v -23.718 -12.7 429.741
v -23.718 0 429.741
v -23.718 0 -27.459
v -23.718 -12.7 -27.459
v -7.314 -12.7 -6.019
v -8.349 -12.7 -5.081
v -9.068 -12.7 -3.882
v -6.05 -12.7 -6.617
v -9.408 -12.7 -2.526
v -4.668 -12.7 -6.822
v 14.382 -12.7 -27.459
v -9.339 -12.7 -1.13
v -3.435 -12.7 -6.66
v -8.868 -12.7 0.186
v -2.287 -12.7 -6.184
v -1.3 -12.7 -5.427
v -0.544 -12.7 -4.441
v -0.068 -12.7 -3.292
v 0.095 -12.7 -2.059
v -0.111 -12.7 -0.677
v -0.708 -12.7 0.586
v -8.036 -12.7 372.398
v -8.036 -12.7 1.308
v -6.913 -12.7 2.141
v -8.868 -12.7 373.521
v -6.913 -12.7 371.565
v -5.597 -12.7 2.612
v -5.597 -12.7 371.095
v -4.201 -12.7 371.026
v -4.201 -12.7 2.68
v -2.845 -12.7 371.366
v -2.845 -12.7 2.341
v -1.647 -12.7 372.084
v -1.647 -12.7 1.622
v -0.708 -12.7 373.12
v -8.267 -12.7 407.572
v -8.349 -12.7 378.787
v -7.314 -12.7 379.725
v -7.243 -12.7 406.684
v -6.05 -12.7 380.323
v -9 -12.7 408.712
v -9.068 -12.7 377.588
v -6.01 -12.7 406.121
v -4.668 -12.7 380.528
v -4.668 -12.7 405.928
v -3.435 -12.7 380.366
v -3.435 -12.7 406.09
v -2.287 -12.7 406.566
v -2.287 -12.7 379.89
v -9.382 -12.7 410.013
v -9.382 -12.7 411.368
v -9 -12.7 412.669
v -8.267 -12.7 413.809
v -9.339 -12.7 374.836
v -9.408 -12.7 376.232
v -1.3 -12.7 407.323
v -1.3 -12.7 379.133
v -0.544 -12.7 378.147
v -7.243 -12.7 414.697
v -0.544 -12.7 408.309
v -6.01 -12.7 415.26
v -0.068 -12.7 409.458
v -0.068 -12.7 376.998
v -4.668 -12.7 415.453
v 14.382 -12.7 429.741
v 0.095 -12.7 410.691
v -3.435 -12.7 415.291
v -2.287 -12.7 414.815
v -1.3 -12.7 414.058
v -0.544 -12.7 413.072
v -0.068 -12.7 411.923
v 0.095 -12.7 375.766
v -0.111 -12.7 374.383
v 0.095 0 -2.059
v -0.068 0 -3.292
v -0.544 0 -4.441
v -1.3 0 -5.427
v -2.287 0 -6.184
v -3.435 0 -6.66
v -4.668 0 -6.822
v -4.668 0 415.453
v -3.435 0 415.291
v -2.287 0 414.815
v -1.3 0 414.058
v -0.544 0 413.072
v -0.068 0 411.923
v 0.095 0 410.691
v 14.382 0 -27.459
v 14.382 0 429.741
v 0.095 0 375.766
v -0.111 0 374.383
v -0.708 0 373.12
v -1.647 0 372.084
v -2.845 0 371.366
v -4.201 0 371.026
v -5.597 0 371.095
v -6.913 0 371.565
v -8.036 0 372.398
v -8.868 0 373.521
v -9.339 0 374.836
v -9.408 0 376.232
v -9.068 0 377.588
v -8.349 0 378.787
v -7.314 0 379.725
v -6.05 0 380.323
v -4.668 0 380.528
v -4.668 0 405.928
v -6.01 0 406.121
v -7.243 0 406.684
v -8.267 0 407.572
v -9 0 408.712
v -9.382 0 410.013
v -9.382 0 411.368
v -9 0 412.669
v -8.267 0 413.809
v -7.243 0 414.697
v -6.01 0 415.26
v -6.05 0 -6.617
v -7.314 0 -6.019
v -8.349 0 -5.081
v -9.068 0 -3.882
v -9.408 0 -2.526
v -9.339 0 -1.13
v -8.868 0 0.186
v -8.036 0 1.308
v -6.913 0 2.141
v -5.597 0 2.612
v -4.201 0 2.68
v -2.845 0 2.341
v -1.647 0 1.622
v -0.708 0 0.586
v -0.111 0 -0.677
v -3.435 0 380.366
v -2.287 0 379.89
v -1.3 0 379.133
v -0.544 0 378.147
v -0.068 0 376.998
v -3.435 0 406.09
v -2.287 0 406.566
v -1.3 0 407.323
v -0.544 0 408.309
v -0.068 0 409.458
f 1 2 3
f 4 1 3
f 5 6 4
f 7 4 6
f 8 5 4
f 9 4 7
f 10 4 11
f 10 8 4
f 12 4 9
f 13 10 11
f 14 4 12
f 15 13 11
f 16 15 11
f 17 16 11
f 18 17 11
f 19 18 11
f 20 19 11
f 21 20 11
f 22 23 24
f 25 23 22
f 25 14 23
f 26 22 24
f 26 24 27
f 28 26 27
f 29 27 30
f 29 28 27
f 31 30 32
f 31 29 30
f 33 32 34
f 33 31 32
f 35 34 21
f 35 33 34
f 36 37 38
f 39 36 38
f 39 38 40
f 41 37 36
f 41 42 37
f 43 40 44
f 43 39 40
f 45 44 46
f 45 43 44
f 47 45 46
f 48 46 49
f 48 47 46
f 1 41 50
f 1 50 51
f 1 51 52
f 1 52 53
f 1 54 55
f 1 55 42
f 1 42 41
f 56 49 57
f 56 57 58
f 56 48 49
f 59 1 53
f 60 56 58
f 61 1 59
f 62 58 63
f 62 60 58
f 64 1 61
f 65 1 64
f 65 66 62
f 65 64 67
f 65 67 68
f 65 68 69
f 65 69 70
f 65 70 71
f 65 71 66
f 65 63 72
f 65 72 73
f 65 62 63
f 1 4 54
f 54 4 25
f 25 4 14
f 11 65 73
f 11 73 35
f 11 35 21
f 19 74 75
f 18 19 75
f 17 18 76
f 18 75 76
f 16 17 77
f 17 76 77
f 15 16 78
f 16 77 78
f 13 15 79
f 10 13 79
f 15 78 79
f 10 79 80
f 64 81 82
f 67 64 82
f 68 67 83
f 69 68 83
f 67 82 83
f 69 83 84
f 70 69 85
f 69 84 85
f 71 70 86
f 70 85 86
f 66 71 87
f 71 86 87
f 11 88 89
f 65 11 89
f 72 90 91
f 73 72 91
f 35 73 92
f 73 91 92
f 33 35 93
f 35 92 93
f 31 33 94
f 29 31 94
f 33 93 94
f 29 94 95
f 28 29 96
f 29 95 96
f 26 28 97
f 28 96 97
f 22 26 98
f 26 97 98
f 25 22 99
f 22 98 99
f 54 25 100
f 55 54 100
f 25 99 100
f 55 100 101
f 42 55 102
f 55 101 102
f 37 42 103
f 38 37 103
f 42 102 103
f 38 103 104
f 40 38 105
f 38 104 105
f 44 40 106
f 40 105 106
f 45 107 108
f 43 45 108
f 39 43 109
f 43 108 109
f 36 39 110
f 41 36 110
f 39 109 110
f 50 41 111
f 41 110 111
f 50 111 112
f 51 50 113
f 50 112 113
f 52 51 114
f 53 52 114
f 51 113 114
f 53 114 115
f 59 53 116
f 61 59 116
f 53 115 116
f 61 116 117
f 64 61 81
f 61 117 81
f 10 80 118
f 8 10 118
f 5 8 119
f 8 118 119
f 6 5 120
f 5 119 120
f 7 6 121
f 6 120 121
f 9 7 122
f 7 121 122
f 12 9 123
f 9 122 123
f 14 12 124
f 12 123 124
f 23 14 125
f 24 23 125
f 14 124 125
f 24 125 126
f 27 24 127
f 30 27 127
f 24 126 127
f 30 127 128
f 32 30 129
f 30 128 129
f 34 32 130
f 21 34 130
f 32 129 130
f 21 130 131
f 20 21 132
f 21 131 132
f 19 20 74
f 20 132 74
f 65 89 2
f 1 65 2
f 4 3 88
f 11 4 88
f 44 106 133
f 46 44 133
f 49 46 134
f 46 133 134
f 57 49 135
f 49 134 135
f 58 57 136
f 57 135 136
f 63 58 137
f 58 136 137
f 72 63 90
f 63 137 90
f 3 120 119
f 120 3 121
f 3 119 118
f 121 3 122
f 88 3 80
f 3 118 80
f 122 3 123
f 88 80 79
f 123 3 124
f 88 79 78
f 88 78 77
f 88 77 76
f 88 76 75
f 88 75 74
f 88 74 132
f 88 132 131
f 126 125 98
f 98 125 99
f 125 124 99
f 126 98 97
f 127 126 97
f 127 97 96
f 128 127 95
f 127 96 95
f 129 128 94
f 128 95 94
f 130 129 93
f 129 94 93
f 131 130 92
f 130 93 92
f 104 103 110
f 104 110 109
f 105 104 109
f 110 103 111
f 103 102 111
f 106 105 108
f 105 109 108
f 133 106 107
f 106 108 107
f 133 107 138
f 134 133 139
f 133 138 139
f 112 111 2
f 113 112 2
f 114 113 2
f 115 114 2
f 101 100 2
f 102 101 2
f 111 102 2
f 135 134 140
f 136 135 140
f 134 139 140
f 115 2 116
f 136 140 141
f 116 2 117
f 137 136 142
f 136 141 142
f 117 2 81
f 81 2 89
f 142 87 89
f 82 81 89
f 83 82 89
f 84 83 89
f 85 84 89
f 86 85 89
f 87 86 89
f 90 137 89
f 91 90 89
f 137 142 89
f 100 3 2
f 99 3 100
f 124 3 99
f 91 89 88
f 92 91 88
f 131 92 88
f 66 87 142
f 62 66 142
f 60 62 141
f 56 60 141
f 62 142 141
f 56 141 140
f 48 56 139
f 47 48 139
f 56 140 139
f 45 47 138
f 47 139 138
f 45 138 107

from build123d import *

# Parameters (mm, degrees)
F1_DEPTH = 12.7


with BuildPart() as f1:
    # F0 (on Front) → F1 (new body)
    with BuildSketch(Plane.XZ):
        with BuildLine():
            ThreePointArc((0.094554, -2.059439), (-8.035542, 1.308157), (-4.667946, -6.821939))
            ThreePointArc((-4.667946, -6.821939), (-1.30035, -5.427035), (0.094554, -2.059439))
        make_face()
        with BuildLine():
            ThreePointArc((0.094554, 375.765561), (-1.30035, 379.133157), (-4.667946, 380.528061))
            ThreePointArc((-4.667946, 380.528061), (-8.035542, 372.397965), (0.094554, 375.765561))
        make_face()
        Polygon((-4.667946, 429.740561), (-23.717946, 429.740561), (-23.717946, -27.459439), (-4.667946, -27.459439), (14.382054, -27.459439), (14.382054, 429.740561), align=None)
        with BuildLine():
            ThreePointArc((0.094554, -2.059439), (-1.30035, -5.427035), (-4.667946, -6.821939))
            ThreePointArc((-4.667946, -6.821939), (-8.035542, 1.308157), (0.094554, -2.059439))
        make_face(mode=Mode.SUBTRACT)
        with BuildLine():
            ThreePointArc((0.094554, 375.765561), (-8.035542, 372.397965), (-4.667946, 380.528061))
            ThreePointArc((-4.667946, 380.528061), (-1.30035, 379.133157), (0.094554, 375.765561))
        make_face(mode=Mode.SUBTRACT)
        with BuildLine():
            ThreePointArc((-4.667946, 405.928061), (-9.430446, 410.690561), (-4.667946, 415.453061))
            ThreePointArc((-4.667946, 415.453061), (-1.30035, 414.058157), (0.094554, 410.690561))
            ThreePointArc((0.094554, 410.690561), (-1.30035, 407.322965), (-4.667946, 405.928061))
        make_face(mode=Mode.SUBTRACT)
    extrude(amount=F1_DEPTH)


solid = f1.part
